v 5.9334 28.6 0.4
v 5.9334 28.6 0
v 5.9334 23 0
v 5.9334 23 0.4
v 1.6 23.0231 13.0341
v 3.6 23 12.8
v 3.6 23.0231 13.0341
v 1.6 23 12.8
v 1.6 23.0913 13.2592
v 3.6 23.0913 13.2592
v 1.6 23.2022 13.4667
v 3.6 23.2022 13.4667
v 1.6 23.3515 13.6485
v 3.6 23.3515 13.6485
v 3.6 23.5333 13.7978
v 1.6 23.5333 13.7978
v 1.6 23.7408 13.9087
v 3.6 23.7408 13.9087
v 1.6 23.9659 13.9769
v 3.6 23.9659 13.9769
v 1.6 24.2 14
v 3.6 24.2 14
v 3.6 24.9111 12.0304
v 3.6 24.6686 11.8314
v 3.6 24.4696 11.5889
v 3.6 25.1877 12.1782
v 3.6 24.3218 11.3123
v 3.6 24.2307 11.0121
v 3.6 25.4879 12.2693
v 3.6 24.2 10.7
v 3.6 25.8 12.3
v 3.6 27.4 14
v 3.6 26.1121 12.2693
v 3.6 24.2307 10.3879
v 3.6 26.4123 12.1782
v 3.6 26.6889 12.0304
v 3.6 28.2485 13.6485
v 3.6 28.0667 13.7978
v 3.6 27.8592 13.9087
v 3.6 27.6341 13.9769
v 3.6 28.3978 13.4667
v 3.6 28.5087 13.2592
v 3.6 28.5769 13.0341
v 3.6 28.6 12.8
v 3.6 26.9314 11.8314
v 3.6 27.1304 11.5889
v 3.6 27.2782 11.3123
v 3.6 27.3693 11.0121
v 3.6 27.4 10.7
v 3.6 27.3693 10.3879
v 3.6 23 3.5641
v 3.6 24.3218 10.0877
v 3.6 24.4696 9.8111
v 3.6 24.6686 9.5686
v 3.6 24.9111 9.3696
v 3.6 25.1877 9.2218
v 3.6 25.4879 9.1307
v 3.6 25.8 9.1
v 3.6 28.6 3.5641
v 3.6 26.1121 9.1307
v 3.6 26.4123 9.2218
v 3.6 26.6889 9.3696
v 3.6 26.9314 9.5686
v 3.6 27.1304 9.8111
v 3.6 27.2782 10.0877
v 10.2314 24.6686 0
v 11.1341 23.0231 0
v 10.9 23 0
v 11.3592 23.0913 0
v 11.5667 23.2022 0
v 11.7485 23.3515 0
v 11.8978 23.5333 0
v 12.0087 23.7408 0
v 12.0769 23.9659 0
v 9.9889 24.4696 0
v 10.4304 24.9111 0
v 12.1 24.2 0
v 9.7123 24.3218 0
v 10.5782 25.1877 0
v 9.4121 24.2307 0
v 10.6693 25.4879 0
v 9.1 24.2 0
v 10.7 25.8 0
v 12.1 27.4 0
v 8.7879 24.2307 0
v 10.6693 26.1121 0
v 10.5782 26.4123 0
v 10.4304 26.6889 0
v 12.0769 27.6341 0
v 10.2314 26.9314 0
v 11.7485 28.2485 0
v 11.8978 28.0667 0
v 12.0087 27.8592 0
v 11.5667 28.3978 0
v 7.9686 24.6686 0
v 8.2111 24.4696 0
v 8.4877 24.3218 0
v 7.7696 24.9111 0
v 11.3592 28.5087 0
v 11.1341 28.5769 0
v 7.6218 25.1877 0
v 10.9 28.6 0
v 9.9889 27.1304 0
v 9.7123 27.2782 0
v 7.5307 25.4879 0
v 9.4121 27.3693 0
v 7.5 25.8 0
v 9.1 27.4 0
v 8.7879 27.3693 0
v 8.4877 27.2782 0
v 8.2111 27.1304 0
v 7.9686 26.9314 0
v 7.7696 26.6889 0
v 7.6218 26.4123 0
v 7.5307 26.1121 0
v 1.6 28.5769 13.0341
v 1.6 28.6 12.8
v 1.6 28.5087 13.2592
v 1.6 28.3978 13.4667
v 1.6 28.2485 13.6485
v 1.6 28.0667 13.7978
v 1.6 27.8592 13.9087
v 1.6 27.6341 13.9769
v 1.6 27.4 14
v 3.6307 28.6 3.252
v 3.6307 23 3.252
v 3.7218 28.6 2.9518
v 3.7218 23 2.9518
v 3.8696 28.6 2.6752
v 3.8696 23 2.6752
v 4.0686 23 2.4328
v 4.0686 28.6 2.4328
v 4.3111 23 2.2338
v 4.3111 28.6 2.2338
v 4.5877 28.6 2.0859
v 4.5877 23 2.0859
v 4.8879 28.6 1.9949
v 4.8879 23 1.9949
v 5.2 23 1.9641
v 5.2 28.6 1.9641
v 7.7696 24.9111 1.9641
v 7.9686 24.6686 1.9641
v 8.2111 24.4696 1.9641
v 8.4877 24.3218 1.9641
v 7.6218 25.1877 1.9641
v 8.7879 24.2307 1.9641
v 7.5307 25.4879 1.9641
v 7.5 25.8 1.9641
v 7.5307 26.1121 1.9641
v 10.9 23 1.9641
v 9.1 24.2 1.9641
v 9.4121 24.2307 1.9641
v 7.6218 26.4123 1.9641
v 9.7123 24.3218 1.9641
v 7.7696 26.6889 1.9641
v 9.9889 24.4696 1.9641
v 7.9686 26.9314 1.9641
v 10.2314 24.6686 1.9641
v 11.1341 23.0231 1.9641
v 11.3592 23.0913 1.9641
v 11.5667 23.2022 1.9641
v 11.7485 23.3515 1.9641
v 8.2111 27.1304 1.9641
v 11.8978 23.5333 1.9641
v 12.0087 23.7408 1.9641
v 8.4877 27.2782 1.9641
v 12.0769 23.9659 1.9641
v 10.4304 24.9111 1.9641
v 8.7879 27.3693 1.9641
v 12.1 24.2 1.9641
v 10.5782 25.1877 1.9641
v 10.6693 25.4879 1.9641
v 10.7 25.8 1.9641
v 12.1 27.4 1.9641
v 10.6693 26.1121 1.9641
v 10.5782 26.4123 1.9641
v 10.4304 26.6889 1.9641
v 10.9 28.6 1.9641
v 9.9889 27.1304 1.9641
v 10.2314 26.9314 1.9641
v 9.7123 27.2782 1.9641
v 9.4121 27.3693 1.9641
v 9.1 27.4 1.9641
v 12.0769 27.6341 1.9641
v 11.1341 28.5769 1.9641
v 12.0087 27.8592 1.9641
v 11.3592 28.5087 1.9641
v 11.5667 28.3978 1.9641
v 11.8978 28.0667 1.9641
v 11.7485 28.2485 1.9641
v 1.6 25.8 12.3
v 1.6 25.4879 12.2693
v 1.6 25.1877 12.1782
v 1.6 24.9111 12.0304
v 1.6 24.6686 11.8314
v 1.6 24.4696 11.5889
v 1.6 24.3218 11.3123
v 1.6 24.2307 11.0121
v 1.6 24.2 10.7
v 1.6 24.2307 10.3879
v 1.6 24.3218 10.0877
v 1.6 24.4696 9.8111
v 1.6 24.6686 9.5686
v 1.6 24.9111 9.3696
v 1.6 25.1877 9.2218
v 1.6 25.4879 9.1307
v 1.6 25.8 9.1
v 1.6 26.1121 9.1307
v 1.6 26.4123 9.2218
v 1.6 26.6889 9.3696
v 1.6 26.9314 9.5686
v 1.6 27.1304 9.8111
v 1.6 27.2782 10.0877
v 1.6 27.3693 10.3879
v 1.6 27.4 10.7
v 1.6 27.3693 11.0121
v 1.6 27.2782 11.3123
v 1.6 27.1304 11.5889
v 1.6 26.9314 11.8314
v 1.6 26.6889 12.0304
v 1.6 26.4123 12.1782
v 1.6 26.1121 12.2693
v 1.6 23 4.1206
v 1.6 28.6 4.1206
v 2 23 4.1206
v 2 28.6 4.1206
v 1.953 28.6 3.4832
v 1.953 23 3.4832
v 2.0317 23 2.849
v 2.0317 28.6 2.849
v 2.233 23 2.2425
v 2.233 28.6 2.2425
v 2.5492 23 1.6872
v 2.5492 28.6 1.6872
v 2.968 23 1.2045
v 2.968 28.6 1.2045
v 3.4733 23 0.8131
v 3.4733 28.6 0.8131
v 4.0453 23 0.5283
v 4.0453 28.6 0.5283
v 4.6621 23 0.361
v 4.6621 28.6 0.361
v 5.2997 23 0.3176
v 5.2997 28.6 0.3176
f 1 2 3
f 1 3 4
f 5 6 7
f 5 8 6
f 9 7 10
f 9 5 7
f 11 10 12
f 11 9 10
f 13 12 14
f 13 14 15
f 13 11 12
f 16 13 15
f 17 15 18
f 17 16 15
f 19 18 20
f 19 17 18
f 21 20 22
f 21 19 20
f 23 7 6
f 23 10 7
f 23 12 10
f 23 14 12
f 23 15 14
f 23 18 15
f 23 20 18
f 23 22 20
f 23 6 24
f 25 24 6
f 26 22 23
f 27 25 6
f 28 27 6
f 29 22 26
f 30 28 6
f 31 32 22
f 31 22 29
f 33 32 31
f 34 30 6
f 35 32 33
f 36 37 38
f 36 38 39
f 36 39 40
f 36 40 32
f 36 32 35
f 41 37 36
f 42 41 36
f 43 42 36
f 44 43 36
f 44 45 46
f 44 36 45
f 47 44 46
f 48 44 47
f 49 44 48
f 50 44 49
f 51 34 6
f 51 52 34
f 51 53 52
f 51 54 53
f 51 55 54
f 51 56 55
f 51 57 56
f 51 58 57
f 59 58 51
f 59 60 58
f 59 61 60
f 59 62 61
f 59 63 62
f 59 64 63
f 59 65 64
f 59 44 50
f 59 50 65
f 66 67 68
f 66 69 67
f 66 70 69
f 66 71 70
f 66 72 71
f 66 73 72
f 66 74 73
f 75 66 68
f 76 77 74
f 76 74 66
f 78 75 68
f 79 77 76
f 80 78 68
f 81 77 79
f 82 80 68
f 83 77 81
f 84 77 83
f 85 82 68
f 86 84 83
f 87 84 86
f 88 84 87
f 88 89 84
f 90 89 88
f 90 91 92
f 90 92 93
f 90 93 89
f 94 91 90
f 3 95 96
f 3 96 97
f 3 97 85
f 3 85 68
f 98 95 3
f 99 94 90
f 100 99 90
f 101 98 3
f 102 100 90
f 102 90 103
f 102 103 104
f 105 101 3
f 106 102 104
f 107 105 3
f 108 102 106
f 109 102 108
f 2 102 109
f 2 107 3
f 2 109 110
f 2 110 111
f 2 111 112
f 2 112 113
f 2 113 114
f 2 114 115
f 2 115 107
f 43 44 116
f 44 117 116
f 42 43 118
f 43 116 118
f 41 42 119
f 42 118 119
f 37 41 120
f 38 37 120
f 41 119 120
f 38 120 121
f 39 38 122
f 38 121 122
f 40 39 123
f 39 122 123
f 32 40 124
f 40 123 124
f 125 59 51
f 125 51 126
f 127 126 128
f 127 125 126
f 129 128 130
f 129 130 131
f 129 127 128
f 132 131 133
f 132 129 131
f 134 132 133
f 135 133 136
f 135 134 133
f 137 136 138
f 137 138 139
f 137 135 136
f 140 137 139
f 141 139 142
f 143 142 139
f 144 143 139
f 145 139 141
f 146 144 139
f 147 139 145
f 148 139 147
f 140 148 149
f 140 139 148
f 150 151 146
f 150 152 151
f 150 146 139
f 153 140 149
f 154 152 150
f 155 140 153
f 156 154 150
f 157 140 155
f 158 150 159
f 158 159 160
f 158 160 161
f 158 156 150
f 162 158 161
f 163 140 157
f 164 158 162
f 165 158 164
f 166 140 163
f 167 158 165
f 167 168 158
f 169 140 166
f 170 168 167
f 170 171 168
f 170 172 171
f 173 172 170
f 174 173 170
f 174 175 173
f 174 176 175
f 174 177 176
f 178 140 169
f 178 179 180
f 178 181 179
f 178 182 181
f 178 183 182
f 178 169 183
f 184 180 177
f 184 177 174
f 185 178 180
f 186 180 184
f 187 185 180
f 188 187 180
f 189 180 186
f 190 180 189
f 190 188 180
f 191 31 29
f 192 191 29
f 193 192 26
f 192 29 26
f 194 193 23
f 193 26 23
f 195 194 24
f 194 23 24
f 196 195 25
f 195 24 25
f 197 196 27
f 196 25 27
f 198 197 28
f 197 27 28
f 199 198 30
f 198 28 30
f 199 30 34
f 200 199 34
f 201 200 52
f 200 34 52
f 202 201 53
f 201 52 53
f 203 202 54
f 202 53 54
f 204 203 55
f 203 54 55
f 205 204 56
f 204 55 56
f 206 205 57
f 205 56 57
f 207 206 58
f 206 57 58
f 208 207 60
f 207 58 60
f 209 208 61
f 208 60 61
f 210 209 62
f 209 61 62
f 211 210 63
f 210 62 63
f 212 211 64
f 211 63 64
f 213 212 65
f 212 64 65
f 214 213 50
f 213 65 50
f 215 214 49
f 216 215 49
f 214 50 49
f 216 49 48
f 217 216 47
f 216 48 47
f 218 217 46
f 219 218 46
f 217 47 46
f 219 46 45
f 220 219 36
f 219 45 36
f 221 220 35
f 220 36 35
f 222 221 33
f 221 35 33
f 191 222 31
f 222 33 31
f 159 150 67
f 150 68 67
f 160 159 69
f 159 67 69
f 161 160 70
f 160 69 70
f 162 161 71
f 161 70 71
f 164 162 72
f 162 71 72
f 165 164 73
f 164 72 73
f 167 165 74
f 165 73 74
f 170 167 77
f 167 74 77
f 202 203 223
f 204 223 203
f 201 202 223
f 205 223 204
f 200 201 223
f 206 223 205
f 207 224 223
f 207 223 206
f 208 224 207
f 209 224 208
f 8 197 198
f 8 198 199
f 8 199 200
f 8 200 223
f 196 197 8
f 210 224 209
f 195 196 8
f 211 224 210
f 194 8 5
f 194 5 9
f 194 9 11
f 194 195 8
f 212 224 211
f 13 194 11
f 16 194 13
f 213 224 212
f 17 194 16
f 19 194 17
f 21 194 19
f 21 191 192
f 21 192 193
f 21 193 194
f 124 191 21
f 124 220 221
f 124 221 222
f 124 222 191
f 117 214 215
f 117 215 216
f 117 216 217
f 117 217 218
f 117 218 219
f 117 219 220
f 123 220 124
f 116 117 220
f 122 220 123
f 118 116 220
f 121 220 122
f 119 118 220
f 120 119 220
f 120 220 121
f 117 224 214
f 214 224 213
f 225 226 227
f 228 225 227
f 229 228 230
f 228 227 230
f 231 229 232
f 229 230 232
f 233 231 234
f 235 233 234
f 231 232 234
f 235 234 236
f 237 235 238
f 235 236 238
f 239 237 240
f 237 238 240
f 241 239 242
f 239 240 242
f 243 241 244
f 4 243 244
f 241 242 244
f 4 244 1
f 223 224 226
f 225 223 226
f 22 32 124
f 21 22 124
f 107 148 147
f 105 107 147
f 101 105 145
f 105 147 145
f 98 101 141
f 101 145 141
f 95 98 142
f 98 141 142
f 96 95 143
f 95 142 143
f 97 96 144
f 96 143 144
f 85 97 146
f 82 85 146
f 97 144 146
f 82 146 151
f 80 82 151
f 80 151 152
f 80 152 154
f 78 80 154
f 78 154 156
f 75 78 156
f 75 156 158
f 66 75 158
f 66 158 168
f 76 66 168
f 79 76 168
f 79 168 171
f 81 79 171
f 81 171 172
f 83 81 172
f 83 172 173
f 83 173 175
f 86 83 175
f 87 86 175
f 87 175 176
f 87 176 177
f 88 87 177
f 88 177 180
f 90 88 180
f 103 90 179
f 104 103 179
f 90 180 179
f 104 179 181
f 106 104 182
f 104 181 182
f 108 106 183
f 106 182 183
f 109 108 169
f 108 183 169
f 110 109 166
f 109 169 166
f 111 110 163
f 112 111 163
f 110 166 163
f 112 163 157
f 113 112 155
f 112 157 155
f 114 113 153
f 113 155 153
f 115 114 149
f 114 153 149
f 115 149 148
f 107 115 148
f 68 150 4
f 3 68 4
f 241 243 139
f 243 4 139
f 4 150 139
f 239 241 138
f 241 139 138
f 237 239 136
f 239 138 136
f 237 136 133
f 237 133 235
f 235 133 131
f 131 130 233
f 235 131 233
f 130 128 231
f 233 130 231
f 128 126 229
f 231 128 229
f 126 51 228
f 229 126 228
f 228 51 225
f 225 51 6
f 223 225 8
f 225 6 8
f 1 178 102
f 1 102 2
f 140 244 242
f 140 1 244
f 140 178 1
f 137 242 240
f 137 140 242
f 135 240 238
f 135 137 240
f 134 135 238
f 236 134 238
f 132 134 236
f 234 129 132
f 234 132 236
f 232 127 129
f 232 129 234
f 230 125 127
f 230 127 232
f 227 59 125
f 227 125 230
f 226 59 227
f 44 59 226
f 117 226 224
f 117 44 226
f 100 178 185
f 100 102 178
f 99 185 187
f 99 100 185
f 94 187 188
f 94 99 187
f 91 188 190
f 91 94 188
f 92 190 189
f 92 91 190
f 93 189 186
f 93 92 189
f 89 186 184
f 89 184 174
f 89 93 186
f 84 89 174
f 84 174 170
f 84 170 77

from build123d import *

# Parameters (mm, degrees)
PAD007_DEPTH    = 5.6
SKETCH011_R     = 1.6
POCKET002_DEPTH = 2
SKETCH012_R     = 1.6
POCKET003_DEPTH = 2
FILLET001_R     = 1.2


with BuildPart() as part:
    # Sketch010 → Pad007 (new body)
    with BuildSketch(Plane.XZ):
        with BuildLine():
            Line((0, 4.120568), (0, 14))
            Line((2, 14), (0, 14))
            Line((2, 14), (2, 3.564131))
            ThreePointArc((2, 3.564131), (2.468629, 2.43276), (3.6, 1.964131))
            Line((3.6, 1.964131), (10.5, 1.964131))
            Line((10.5, 1.964131), (10.5, 0))
            Line((10.5, 0), (4.333415, 0))
            Line((4.333415, 0), (4.333415, 0.4))
            ThreePointArc((0.4, 4.120568), (1.368035, 1.204479), (4.333415, 0.4))
            Line((0, 4.120568), (0.4, 4.120568))
        make_face()
    extrude(amount=PAD007_DEPTH)

    # Sketch011 (on Face4 of Pad007) → Pocket002 (cut)
    with BuildSketch(Plane(origin=(2, 0, 0), x_dir=(0, 0, 1), z_dir=(1, 0, 0))):
        with Locations((10.7, 2.8)):
            Circle(SKETCH011_R)
    extrude(amount=-POCKET002_DEPTH, mode=Mode.SUBTRACT)

    # Sketch012 (on Face11 of Pocket002) → Pocket003 (cut)
    with BuildSketch(Plane(origin=(0, 0, 1.964131), x_dir=(-1, 0, 0), z_dir=(0, 0, 1))):
        with Locations((-7.5, 2.8)):
            Circle(SKETCH012_R)
    extrude(amount=-POCKET003_DEPTH, mode=Mode.SUBTRACT)

    # Fillet001
    fillet001_edges = [part.edges().sort_by_distance(p)[0] for p in [
        (1, 0, 14),
        (1, -5.6, 14),
        (10.5, -5.6, 0.982065),
        (10.5, 0, 0.982065),
    ]]
    fillet(fillet001_edges, radius=FILLET001_R)


with BuildPart() as part_1:
    # Body005 placement: moved
    add(part.part.moved(Location((1.6, 28.6, 0))))


solid = part_1.part
